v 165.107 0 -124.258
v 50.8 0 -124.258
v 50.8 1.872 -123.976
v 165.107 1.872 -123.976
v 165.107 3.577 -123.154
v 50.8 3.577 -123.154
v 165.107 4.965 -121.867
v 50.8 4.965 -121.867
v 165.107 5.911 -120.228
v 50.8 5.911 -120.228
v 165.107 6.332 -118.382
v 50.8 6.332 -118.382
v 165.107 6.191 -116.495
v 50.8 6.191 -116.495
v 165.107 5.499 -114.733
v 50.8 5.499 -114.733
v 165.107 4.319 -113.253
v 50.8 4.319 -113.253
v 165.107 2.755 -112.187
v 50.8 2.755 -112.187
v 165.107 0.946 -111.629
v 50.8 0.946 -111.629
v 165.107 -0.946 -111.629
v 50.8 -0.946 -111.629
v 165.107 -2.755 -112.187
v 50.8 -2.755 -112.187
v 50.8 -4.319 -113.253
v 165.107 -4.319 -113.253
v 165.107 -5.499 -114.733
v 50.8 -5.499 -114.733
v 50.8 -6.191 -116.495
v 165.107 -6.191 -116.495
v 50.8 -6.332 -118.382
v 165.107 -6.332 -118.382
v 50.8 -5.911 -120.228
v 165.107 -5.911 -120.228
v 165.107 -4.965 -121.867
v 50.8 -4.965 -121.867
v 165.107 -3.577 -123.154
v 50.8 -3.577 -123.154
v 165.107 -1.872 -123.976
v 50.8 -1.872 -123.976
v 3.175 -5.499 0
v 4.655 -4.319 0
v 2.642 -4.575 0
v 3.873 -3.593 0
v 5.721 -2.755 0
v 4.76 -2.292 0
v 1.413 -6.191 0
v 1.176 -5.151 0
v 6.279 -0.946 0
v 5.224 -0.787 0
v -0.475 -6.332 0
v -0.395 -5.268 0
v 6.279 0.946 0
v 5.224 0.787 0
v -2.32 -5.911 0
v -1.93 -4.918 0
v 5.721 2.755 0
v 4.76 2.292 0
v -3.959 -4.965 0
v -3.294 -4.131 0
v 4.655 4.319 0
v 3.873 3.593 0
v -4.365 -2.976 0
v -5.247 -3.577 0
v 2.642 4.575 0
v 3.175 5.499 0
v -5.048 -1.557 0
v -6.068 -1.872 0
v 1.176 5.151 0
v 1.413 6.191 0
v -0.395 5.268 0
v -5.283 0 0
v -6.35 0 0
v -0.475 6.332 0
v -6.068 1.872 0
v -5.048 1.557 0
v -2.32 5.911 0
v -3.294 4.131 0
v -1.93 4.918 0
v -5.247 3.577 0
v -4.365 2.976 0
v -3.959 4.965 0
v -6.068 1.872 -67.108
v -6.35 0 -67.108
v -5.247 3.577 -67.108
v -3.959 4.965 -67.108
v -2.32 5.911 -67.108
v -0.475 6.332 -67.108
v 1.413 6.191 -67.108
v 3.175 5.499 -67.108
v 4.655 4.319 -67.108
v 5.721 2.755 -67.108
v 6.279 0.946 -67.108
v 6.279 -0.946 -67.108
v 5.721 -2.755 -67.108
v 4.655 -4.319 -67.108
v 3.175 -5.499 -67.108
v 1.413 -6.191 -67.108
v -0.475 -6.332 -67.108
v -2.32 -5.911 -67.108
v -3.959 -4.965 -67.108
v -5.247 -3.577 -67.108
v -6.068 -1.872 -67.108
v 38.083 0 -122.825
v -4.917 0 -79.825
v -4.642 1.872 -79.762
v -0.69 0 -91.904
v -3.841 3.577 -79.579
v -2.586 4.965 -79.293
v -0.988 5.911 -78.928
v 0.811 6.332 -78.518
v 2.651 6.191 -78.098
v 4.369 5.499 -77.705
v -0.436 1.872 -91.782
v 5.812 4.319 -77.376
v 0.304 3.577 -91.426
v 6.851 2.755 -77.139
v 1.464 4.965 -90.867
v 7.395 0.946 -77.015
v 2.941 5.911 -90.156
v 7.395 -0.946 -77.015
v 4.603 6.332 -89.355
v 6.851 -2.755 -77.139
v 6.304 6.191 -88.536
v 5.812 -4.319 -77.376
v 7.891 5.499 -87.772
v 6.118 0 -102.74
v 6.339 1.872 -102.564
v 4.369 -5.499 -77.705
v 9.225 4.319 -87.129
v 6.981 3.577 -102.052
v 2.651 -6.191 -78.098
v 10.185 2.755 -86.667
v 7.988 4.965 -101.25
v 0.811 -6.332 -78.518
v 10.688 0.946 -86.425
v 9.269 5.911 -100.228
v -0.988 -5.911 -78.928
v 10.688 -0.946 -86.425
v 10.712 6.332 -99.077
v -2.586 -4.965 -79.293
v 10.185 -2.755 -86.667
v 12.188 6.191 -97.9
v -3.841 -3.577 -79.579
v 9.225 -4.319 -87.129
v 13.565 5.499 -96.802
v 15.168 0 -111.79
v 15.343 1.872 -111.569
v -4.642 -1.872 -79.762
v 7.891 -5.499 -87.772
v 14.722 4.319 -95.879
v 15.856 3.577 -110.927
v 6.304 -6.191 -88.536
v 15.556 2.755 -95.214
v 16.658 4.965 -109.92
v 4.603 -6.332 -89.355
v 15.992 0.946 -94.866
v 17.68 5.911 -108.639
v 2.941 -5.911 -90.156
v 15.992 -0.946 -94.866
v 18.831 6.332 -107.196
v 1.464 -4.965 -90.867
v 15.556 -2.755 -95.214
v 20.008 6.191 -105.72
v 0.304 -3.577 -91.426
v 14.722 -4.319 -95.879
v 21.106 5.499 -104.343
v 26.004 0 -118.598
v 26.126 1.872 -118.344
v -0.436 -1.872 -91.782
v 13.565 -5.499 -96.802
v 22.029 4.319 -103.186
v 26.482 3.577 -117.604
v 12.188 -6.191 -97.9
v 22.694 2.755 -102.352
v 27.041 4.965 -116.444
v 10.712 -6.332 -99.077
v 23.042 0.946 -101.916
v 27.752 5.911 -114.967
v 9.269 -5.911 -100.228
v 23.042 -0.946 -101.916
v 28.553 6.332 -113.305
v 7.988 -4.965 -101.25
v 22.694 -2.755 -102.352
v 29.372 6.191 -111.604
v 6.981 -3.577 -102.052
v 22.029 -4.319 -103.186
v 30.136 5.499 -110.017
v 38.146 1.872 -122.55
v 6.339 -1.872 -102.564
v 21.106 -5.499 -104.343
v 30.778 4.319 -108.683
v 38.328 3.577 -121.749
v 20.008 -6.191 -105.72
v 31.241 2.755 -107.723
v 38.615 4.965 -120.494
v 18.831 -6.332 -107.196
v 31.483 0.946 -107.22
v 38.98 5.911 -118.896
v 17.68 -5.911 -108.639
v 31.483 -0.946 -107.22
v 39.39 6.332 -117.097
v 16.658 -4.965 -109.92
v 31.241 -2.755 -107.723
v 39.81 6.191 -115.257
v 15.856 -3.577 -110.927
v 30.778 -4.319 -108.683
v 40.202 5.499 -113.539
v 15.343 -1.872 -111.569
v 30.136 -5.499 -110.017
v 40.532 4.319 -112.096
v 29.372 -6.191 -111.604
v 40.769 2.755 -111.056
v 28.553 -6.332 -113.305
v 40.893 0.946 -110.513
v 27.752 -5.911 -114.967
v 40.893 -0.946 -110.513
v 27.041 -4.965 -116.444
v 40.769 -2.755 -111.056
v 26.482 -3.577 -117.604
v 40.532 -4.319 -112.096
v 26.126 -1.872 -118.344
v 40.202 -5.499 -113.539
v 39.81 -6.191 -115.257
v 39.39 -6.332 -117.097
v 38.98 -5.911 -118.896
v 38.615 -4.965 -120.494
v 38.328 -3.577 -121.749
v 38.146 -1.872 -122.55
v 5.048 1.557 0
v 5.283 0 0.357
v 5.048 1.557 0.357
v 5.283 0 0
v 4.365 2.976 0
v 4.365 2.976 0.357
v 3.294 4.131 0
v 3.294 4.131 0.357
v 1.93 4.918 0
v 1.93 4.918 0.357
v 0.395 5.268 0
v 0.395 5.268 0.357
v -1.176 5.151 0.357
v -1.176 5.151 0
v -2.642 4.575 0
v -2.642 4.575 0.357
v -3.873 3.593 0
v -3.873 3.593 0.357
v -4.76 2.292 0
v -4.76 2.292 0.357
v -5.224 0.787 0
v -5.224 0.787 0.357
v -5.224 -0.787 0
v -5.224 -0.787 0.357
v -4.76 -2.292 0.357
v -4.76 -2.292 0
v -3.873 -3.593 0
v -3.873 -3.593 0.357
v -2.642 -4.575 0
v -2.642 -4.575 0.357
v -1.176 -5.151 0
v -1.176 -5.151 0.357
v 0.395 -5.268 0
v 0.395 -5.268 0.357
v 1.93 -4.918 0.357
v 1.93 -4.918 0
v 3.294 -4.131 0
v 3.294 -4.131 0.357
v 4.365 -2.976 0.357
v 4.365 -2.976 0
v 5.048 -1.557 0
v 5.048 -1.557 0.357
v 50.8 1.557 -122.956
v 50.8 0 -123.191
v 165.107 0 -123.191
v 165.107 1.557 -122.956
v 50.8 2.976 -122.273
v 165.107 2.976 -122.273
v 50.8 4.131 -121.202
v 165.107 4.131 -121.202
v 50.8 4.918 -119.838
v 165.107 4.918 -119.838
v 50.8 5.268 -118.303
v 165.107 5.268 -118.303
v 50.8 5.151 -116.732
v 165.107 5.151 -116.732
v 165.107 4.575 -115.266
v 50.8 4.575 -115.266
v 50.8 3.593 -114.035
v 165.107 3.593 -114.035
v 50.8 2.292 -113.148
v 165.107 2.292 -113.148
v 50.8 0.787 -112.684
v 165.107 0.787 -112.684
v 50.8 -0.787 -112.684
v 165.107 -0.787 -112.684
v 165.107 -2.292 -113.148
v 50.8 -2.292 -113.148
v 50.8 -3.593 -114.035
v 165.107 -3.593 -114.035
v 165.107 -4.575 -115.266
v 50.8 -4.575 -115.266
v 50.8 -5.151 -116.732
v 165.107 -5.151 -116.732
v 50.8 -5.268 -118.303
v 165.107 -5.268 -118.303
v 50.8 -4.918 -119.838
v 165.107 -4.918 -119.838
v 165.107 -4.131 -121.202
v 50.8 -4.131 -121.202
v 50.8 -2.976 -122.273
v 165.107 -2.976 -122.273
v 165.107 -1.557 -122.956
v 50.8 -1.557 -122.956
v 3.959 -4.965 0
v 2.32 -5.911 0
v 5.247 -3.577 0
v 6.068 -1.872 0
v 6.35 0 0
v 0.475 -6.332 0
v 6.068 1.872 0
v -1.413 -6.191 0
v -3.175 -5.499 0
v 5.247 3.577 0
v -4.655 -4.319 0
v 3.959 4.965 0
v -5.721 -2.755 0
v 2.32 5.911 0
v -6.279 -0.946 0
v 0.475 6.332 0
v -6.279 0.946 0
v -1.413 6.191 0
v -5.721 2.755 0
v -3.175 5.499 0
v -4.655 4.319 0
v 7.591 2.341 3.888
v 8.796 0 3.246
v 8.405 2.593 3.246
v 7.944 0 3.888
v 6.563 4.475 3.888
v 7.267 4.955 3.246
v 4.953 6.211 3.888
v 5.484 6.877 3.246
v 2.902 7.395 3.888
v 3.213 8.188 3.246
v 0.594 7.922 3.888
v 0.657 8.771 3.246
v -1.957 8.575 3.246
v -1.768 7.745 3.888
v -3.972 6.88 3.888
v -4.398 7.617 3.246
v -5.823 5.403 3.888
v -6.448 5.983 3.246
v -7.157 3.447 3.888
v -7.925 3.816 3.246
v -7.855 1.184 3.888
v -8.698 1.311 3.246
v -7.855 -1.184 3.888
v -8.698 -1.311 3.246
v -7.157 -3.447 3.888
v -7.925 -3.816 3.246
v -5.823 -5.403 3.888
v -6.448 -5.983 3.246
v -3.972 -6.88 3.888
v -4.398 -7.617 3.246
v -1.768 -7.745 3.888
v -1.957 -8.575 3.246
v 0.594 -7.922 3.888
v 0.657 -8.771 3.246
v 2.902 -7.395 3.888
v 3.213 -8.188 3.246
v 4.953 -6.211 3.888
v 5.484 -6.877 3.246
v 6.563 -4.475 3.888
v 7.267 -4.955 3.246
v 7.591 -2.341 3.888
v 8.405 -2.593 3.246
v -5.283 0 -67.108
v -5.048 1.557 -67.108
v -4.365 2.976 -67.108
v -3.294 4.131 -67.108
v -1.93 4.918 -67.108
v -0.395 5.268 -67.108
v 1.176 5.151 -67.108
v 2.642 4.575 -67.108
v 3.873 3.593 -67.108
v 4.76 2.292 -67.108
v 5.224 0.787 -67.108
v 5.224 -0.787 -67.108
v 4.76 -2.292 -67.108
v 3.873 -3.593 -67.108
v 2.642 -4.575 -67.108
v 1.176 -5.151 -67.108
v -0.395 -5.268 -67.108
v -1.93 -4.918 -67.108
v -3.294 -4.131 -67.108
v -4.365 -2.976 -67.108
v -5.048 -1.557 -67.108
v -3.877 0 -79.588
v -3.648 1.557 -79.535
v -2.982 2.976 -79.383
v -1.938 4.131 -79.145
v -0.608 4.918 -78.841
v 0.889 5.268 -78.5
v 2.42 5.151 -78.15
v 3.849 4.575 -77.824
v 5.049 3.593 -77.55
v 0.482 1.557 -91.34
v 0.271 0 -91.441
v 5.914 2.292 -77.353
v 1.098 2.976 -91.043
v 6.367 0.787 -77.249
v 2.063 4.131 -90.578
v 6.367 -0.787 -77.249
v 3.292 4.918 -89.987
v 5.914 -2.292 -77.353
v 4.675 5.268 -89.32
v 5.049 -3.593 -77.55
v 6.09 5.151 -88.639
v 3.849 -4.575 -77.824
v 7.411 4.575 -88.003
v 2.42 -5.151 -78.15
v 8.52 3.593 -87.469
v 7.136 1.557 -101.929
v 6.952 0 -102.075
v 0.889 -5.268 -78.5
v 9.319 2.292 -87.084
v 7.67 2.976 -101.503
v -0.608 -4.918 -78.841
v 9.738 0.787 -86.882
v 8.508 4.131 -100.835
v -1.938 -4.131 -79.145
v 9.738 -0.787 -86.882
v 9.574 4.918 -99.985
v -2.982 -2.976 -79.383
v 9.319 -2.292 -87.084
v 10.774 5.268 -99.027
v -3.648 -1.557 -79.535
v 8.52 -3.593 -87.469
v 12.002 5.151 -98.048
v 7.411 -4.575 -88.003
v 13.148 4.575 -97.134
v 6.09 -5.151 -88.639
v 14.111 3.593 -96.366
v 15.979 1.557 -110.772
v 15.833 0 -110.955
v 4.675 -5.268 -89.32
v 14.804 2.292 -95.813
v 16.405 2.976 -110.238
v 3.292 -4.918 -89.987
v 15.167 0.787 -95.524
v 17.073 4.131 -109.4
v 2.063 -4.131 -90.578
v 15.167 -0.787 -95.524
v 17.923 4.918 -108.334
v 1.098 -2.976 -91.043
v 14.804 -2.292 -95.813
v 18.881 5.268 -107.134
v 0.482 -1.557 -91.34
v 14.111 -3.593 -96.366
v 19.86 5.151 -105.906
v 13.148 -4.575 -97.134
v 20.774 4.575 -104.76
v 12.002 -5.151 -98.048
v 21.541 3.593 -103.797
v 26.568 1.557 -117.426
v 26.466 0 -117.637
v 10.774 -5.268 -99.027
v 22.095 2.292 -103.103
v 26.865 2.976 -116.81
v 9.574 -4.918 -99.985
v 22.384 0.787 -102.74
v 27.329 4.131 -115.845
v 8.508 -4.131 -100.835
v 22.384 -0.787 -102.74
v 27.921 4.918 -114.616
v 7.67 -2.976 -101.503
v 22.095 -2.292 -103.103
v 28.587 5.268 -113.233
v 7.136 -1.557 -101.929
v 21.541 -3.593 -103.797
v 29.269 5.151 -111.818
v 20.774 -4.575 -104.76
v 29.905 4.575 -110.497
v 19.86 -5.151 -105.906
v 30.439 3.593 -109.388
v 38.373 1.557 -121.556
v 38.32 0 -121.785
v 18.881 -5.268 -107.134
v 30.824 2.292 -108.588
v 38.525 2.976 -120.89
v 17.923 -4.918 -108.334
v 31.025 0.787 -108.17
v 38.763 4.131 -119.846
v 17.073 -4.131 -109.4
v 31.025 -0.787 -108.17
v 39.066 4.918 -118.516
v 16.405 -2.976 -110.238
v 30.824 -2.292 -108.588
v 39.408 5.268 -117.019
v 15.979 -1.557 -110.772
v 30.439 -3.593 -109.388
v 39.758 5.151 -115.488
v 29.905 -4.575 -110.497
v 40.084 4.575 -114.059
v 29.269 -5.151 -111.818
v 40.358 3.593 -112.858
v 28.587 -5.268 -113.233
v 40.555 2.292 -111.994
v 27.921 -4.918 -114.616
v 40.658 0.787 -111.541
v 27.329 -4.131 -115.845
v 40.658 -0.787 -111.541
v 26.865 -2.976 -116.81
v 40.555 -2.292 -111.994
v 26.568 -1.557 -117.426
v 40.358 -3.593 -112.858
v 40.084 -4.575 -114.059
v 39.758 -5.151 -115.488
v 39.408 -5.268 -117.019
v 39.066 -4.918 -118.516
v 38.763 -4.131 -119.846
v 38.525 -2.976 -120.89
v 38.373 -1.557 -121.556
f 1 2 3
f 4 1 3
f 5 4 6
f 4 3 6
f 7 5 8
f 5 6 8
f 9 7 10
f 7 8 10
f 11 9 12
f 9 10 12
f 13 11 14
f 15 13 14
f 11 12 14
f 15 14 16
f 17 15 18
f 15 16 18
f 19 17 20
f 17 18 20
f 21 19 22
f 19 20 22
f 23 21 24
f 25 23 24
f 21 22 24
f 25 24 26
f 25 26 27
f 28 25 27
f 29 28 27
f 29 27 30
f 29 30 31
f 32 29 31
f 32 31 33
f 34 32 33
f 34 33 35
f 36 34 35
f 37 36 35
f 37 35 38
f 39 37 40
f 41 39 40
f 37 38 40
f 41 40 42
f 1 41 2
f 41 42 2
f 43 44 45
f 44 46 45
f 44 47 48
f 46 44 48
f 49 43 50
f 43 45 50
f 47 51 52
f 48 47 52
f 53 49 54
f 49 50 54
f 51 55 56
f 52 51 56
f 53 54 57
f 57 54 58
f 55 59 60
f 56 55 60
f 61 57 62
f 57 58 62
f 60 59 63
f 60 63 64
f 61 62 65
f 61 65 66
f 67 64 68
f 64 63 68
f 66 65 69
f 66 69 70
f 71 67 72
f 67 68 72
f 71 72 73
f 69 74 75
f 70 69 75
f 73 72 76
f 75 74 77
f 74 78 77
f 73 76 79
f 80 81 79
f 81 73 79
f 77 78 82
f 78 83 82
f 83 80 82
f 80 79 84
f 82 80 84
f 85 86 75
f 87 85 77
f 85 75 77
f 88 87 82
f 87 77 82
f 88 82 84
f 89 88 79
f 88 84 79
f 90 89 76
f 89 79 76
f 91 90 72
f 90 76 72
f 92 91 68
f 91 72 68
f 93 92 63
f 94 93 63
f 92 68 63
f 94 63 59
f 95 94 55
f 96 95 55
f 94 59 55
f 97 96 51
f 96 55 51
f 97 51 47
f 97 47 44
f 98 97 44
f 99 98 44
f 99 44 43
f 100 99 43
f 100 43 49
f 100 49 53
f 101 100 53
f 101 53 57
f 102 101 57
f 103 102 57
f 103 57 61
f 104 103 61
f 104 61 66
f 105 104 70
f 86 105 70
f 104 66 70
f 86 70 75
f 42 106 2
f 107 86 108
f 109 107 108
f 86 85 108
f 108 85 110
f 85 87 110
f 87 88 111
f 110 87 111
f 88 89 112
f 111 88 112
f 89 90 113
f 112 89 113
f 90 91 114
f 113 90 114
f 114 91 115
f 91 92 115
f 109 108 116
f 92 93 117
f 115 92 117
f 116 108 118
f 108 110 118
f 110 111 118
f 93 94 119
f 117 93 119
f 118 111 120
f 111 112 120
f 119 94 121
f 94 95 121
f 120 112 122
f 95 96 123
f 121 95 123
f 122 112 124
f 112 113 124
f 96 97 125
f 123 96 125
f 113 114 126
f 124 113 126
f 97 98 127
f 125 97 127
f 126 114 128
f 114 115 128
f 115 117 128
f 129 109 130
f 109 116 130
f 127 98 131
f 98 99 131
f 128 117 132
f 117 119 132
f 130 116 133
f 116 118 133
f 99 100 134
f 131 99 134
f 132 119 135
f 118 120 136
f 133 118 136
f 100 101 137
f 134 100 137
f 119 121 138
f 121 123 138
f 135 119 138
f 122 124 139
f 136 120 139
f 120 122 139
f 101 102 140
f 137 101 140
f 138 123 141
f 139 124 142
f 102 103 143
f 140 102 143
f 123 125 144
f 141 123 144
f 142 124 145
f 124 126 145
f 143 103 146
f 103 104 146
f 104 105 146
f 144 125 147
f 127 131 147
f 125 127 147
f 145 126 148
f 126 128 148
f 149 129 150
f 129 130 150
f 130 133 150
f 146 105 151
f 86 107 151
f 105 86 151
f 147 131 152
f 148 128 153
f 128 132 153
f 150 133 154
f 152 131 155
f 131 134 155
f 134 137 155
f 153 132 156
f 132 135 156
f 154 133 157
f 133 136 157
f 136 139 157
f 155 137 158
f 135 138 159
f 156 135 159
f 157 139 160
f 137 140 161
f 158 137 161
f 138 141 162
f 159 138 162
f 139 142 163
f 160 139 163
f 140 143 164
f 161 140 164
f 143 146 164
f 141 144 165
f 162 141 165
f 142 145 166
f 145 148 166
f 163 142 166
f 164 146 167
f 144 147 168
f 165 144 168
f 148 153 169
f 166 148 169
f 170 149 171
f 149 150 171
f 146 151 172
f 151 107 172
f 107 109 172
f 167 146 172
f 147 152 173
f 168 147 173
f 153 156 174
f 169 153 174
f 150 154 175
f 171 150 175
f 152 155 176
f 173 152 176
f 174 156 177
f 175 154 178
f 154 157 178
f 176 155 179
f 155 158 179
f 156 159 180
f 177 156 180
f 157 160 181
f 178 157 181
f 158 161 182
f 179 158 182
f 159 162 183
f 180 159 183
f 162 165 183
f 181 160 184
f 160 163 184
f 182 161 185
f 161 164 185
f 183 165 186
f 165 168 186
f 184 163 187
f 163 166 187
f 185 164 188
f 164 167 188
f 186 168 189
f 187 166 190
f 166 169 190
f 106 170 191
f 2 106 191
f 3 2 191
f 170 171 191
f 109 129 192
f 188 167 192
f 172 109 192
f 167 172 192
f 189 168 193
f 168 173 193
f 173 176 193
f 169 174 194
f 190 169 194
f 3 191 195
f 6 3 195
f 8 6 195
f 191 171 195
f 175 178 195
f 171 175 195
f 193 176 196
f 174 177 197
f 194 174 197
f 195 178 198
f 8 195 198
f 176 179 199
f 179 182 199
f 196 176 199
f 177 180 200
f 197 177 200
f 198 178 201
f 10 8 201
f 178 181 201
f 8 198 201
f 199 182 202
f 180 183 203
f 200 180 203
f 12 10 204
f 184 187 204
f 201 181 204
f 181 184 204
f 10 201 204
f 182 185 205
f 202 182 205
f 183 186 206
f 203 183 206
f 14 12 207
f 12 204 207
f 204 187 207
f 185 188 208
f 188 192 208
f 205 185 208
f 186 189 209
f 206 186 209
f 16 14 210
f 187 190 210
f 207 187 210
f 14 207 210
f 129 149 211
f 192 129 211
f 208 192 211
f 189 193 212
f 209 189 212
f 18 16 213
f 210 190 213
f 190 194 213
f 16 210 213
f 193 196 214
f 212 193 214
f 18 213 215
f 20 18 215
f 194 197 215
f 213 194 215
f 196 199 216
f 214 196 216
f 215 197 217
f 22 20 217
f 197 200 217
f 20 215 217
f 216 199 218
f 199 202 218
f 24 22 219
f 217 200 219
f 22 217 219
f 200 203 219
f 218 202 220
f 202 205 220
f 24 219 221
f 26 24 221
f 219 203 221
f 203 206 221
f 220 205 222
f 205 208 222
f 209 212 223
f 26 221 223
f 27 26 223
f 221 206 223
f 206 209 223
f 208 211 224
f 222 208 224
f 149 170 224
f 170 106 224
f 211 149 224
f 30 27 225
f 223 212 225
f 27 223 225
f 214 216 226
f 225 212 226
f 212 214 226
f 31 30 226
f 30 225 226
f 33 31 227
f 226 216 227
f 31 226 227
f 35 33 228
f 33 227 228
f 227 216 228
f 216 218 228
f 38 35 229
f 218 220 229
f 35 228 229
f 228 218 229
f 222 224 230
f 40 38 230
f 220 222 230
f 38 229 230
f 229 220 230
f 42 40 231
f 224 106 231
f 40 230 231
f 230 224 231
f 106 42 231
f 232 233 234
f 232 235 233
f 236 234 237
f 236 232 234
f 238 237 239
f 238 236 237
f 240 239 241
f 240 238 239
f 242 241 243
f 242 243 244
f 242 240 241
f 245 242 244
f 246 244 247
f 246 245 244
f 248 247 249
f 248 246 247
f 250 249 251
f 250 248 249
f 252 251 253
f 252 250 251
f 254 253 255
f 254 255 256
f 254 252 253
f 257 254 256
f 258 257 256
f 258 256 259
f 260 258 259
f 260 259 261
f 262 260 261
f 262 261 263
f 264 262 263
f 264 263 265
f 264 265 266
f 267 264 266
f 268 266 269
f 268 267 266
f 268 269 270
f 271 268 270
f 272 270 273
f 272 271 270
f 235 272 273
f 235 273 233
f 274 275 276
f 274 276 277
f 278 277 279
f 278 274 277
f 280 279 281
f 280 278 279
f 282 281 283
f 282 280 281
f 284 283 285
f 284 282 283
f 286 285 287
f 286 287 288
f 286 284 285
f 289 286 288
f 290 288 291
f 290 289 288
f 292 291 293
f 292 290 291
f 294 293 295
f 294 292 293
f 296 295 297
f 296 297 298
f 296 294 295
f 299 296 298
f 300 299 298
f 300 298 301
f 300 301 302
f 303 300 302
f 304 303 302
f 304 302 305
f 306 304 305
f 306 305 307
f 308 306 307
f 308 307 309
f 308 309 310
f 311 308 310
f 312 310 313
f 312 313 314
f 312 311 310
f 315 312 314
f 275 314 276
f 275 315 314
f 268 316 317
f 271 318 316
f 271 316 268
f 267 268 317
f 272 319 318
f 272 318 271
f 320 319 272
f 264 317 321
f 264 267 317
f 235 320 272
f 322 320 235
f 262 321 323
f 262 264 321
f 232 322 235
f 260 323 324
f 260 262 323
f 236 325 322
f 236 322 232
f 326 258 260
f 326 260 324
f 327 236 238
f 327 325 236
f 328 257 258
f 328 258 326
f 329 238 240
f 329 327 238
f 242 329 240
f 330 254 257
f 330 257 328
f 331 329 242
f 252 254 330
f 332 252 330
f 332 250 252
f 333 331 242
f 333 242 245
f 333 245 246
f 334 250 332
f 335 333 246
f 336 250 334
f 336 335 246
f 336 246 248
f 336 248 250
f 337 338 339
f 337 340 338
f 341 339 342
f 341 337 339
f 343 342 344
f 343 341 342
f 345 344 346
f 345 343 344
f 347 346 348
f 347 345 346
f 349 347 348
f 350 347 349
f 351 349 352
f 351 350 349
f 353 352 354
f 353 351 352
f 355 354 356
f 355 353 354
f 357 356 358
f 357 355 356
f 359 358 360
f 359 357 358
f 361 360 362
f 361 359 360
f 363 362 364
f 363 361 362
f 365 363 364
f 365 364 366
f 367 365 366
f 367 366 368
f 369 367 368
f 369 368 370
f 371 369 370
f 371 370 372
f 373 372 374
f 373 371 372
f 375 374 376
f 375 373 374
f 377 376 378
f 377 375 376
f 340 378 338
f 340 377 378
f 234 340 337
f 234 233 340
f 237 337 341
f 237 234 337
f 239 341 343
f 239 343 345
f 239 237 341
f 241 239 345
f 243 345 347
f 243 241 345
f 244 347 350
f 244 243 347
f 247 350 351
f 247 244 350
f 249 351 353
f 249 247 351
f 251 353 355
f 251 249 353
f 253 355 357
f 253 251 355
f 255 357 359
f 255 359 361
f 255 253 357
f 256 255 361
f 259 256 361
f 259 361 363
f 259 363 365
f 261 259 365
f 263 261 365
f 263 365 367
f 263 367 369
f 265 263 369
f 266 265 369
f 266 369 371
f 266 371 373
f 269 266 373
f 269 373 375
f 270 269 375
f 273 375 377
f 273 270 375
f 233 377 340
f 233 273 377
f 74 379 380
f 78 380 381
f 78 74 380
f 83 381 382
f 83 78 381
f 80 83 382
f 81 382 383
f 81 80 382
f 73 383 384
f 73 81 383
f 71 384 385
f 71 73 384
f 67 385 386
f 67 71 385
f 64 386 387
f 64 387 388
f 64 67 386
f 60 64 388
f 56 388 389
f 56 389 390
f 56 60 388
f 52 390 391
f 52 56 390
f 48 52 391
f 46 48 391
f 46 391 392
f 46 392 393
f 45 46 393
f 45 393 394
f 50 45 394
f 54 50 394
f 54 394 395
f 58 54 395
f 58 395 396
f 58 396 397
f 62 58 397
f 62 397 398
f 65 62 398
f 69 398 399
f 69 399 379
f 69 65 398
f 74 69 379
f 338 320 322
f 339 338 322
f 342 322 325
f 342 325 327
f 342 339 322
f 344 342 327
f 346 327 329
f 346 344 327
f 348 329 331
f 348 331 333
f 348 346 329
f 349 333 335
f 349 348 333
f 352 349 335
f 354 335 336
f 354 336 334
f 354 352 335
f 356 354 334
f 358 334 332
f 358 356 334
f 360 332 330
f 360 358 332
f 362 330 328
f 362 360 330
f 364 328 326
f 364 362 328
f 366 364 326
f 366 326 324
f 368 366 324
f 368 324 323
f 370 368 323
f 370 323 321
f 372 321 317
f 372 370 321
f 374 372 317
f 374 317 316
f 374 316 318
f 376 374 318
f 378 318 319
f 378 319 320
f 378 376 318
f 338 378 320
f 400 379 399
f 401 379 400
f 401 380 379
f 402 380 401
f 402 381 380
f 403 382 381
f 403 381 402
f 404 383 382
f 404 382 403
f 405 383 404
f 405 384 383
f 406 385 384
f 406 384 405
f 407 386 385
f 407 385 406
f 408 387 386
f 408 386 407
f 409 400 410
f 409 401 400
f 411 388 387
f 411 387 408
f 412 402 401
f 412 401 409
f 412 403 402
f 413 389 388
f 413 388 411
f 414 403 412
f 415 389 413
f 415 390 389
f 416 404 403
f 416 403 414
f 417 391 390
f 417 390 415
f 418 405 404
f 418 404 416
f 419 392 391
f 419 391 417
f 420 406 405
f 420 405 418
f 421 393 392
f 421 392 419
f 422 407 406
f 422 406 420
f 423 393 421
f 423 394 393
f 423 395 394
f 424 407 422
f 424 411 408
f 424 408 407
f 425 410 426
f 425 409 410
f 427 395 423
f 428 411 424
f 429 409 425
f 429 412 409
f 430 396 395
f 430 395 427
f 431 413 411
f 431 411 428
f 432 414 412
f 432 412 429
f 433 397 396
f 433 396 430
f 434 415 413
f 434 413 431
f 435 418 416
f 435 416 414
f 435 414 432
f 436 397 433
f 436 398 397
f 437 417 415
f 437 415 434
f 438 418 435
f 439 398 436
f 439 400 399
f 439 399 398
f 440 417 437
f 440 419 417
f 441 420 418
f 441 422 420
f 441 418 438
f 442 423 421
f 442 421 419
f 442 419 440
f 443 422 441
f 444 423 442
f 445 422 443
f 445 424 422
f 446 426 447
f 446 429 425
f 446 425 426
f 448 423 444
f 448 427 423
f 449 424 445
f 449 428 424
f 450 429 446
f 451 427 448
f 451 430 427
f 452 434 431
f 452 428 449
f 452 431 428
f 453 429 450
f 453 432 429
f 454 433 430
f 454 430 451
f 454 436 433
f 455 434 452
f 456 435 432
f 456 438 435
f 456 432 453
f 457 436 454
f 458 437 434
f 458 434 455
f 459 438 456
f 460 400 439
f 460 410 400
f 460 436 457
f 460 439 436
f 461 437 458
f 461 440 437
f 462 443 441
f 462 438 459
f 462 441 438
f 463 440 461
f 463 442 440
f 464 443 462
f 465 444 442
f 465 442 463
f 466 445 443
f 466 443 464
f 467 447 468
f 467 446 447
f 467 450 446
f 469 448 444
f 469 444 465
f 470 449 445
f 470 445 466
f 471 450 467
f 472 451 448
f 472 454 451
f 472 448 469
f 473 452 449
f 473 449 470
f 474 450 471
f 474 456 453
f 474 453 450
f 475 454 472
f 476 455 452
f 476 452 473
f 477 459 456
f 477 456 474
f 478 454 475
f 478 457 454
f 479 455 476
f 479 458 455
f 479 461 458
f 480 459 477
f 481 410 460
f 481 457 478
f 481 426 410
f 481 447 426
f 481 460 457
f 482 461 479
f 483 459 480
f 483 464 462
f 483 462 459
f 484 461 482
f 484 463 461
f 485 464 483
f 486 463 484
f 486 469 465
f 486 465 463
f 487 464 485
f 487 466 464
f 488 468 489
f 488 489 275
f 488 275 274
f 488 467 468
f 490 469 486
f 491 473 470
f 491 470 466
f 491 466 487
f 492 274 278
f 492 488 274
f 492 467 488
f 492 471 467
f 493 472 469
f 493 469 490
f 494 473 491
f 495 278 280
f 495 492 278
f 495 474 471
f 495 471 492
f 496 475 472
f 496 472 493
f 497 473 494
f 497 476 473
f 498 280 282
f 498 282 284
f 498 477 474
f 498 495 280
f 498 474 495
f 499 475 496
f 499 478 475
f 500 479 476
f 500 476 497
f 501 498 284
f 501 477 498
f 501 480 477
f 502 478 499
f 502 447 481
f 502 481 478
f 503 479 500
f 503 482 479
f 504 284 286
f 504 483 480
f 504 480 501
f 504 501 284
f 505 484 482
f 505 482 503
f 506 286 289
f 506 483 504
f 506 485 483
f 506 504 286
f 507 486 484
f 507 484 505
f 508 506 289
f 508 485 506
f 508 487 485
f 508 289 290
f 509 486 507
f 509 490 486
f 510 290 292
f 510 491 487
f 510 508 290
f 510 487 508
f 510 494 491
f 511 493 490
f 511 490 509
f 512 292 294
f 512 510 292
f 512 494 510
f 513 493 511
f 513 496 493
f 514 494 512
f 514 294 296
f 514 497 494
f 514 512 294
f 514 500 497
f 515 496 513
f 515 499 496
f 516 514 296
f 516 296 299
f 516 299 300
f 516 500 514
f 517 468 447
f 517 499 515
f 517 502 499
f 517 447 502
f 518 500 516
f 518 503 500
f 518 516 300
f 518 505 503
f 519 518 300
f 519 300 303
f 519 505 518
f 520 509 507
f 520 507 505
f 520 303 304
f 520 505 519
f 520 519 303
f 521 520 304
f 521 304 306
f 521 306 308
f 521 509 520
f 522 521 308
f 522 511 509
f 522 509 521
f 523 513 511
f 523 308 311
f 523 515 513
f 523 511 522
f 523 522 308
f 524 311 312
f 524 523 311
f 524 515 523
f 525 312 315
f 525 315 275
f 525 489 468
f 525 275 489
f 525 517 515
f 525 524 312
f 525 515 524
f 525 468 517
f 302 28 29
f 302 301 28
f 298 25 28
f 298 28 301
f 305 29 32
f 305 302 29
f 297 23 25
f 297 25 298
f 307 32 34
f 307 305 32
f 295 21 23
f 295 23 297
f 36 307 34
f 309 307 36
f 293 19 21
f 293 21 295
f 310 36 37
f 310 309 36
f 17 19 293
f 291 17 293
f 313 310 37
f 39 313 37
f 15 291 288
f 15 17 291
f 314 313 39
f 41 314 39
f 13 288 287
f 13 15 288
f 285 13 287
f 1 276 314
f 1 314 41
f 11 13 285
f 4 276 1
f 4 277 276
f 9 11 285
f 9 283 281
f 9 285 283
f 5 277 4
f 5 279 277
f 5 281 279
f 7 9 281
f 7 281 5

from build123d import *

# Parameters (mm, degrees)
SKETCH1_R                 = 6.35
SKETCH1_R_2               = 5.2832
PIPE_0_5_SCH_40_1_DEPTH   = 67.107863905
SKETCH1_ON_SEGMENT_2_R    = 6.35
SKETCH1_ON_SEGMENT_2_R_2  = 5.2832
PIPE_0_5_SCH_40_1_2_ANGLE = 90
SKETCH1_ON_SEGMENT_3_R    = 6.35
SKETCH1_ON_SEGMENT_3_R_2  = 5.2832
PIPE_0_5_SCH_40_1_3_DEPTH = 114.307049194


# Read off the part's stored shape, not the designer's step: Revolve1
with BuildPart() as part:
    # Revolve1 outline → Revolve1 (revolve)
    with BuildSketch(Plane.XZ):
        Polygon((5.2832, 0.356946287), (5.2832, 0), (6.35, 0), (8.795776254, 3.245654713), (7.943791892, 3.88767098), align=None)
    revolve(axis=Axis((0, 0, 0), (0, 0, 1)))


with BuildPart() as body_2:
    # Sketch1 → Pipe 0.5 SCH 40(1) (new body)
    with BuildSketch(Plane(origin=(0, 0, 0), x_dir=(-1, 0, 0), z_dir=(0, 0, -1))):
        Circle(SKETCH1_R)
        Circle(SKETCH1_R_2, mode=Mode.SUBTRACT)
    extrude(amount=PIPE_0_5_SCH_40_1_DEPTH)


with BuildPart() as body_3:
    # Sketch1 on segment 2 (carried to the start of arc 2) → Pipe 0.5 SCH 40_1 2 (revolve)
    with BuildSketch(Plane(origin=(0, 0, -67.107863905), x_dir=(-1, 0, 0), z_dir=(0, 0, -1))):
        Circle(SKETCH1_ON_SEGMENT_2_R)
        Circle(SKETCH1_ON_SEGMENT_2_R_2, mode=Mode.SUBTRACT)
    revolve(axis=Axis((50.8, 0, -67.107863905), (0, -1, 0)), revolution_arc=PIPE_0_5_SCH_40_1_2_ANGLE)


with BuildPart() as body_4:
    # Sketch1 on segment 3 (carried to segment 3) → Pipe 0.5 SCH 40_1 3 (new body)
    with BuildSketch(Plane(origin=(50.8, 0, -117.907863905), x_dir=(0, 0, -1), z_dir=(1, 0, 0))):
        Circle(SKETCH1_ON_SEGMENT_3_R)
        Circle(SKETCH1_ON_SEGMENT_3_R_2, mode=Mode.SUBTRACT)
    extrude(amount=PIPE_0_5_SCH_40_1_3_DEPTH)


with BuildPart() as body_2_1:
    add(body_2.part)

    # Pipe 0.5 SCH 40(1) as one body: union body 3, body 4
    add(body_3.part)
    add(body_4.part)


solid = Compound([part.part, body_2_1.part])
